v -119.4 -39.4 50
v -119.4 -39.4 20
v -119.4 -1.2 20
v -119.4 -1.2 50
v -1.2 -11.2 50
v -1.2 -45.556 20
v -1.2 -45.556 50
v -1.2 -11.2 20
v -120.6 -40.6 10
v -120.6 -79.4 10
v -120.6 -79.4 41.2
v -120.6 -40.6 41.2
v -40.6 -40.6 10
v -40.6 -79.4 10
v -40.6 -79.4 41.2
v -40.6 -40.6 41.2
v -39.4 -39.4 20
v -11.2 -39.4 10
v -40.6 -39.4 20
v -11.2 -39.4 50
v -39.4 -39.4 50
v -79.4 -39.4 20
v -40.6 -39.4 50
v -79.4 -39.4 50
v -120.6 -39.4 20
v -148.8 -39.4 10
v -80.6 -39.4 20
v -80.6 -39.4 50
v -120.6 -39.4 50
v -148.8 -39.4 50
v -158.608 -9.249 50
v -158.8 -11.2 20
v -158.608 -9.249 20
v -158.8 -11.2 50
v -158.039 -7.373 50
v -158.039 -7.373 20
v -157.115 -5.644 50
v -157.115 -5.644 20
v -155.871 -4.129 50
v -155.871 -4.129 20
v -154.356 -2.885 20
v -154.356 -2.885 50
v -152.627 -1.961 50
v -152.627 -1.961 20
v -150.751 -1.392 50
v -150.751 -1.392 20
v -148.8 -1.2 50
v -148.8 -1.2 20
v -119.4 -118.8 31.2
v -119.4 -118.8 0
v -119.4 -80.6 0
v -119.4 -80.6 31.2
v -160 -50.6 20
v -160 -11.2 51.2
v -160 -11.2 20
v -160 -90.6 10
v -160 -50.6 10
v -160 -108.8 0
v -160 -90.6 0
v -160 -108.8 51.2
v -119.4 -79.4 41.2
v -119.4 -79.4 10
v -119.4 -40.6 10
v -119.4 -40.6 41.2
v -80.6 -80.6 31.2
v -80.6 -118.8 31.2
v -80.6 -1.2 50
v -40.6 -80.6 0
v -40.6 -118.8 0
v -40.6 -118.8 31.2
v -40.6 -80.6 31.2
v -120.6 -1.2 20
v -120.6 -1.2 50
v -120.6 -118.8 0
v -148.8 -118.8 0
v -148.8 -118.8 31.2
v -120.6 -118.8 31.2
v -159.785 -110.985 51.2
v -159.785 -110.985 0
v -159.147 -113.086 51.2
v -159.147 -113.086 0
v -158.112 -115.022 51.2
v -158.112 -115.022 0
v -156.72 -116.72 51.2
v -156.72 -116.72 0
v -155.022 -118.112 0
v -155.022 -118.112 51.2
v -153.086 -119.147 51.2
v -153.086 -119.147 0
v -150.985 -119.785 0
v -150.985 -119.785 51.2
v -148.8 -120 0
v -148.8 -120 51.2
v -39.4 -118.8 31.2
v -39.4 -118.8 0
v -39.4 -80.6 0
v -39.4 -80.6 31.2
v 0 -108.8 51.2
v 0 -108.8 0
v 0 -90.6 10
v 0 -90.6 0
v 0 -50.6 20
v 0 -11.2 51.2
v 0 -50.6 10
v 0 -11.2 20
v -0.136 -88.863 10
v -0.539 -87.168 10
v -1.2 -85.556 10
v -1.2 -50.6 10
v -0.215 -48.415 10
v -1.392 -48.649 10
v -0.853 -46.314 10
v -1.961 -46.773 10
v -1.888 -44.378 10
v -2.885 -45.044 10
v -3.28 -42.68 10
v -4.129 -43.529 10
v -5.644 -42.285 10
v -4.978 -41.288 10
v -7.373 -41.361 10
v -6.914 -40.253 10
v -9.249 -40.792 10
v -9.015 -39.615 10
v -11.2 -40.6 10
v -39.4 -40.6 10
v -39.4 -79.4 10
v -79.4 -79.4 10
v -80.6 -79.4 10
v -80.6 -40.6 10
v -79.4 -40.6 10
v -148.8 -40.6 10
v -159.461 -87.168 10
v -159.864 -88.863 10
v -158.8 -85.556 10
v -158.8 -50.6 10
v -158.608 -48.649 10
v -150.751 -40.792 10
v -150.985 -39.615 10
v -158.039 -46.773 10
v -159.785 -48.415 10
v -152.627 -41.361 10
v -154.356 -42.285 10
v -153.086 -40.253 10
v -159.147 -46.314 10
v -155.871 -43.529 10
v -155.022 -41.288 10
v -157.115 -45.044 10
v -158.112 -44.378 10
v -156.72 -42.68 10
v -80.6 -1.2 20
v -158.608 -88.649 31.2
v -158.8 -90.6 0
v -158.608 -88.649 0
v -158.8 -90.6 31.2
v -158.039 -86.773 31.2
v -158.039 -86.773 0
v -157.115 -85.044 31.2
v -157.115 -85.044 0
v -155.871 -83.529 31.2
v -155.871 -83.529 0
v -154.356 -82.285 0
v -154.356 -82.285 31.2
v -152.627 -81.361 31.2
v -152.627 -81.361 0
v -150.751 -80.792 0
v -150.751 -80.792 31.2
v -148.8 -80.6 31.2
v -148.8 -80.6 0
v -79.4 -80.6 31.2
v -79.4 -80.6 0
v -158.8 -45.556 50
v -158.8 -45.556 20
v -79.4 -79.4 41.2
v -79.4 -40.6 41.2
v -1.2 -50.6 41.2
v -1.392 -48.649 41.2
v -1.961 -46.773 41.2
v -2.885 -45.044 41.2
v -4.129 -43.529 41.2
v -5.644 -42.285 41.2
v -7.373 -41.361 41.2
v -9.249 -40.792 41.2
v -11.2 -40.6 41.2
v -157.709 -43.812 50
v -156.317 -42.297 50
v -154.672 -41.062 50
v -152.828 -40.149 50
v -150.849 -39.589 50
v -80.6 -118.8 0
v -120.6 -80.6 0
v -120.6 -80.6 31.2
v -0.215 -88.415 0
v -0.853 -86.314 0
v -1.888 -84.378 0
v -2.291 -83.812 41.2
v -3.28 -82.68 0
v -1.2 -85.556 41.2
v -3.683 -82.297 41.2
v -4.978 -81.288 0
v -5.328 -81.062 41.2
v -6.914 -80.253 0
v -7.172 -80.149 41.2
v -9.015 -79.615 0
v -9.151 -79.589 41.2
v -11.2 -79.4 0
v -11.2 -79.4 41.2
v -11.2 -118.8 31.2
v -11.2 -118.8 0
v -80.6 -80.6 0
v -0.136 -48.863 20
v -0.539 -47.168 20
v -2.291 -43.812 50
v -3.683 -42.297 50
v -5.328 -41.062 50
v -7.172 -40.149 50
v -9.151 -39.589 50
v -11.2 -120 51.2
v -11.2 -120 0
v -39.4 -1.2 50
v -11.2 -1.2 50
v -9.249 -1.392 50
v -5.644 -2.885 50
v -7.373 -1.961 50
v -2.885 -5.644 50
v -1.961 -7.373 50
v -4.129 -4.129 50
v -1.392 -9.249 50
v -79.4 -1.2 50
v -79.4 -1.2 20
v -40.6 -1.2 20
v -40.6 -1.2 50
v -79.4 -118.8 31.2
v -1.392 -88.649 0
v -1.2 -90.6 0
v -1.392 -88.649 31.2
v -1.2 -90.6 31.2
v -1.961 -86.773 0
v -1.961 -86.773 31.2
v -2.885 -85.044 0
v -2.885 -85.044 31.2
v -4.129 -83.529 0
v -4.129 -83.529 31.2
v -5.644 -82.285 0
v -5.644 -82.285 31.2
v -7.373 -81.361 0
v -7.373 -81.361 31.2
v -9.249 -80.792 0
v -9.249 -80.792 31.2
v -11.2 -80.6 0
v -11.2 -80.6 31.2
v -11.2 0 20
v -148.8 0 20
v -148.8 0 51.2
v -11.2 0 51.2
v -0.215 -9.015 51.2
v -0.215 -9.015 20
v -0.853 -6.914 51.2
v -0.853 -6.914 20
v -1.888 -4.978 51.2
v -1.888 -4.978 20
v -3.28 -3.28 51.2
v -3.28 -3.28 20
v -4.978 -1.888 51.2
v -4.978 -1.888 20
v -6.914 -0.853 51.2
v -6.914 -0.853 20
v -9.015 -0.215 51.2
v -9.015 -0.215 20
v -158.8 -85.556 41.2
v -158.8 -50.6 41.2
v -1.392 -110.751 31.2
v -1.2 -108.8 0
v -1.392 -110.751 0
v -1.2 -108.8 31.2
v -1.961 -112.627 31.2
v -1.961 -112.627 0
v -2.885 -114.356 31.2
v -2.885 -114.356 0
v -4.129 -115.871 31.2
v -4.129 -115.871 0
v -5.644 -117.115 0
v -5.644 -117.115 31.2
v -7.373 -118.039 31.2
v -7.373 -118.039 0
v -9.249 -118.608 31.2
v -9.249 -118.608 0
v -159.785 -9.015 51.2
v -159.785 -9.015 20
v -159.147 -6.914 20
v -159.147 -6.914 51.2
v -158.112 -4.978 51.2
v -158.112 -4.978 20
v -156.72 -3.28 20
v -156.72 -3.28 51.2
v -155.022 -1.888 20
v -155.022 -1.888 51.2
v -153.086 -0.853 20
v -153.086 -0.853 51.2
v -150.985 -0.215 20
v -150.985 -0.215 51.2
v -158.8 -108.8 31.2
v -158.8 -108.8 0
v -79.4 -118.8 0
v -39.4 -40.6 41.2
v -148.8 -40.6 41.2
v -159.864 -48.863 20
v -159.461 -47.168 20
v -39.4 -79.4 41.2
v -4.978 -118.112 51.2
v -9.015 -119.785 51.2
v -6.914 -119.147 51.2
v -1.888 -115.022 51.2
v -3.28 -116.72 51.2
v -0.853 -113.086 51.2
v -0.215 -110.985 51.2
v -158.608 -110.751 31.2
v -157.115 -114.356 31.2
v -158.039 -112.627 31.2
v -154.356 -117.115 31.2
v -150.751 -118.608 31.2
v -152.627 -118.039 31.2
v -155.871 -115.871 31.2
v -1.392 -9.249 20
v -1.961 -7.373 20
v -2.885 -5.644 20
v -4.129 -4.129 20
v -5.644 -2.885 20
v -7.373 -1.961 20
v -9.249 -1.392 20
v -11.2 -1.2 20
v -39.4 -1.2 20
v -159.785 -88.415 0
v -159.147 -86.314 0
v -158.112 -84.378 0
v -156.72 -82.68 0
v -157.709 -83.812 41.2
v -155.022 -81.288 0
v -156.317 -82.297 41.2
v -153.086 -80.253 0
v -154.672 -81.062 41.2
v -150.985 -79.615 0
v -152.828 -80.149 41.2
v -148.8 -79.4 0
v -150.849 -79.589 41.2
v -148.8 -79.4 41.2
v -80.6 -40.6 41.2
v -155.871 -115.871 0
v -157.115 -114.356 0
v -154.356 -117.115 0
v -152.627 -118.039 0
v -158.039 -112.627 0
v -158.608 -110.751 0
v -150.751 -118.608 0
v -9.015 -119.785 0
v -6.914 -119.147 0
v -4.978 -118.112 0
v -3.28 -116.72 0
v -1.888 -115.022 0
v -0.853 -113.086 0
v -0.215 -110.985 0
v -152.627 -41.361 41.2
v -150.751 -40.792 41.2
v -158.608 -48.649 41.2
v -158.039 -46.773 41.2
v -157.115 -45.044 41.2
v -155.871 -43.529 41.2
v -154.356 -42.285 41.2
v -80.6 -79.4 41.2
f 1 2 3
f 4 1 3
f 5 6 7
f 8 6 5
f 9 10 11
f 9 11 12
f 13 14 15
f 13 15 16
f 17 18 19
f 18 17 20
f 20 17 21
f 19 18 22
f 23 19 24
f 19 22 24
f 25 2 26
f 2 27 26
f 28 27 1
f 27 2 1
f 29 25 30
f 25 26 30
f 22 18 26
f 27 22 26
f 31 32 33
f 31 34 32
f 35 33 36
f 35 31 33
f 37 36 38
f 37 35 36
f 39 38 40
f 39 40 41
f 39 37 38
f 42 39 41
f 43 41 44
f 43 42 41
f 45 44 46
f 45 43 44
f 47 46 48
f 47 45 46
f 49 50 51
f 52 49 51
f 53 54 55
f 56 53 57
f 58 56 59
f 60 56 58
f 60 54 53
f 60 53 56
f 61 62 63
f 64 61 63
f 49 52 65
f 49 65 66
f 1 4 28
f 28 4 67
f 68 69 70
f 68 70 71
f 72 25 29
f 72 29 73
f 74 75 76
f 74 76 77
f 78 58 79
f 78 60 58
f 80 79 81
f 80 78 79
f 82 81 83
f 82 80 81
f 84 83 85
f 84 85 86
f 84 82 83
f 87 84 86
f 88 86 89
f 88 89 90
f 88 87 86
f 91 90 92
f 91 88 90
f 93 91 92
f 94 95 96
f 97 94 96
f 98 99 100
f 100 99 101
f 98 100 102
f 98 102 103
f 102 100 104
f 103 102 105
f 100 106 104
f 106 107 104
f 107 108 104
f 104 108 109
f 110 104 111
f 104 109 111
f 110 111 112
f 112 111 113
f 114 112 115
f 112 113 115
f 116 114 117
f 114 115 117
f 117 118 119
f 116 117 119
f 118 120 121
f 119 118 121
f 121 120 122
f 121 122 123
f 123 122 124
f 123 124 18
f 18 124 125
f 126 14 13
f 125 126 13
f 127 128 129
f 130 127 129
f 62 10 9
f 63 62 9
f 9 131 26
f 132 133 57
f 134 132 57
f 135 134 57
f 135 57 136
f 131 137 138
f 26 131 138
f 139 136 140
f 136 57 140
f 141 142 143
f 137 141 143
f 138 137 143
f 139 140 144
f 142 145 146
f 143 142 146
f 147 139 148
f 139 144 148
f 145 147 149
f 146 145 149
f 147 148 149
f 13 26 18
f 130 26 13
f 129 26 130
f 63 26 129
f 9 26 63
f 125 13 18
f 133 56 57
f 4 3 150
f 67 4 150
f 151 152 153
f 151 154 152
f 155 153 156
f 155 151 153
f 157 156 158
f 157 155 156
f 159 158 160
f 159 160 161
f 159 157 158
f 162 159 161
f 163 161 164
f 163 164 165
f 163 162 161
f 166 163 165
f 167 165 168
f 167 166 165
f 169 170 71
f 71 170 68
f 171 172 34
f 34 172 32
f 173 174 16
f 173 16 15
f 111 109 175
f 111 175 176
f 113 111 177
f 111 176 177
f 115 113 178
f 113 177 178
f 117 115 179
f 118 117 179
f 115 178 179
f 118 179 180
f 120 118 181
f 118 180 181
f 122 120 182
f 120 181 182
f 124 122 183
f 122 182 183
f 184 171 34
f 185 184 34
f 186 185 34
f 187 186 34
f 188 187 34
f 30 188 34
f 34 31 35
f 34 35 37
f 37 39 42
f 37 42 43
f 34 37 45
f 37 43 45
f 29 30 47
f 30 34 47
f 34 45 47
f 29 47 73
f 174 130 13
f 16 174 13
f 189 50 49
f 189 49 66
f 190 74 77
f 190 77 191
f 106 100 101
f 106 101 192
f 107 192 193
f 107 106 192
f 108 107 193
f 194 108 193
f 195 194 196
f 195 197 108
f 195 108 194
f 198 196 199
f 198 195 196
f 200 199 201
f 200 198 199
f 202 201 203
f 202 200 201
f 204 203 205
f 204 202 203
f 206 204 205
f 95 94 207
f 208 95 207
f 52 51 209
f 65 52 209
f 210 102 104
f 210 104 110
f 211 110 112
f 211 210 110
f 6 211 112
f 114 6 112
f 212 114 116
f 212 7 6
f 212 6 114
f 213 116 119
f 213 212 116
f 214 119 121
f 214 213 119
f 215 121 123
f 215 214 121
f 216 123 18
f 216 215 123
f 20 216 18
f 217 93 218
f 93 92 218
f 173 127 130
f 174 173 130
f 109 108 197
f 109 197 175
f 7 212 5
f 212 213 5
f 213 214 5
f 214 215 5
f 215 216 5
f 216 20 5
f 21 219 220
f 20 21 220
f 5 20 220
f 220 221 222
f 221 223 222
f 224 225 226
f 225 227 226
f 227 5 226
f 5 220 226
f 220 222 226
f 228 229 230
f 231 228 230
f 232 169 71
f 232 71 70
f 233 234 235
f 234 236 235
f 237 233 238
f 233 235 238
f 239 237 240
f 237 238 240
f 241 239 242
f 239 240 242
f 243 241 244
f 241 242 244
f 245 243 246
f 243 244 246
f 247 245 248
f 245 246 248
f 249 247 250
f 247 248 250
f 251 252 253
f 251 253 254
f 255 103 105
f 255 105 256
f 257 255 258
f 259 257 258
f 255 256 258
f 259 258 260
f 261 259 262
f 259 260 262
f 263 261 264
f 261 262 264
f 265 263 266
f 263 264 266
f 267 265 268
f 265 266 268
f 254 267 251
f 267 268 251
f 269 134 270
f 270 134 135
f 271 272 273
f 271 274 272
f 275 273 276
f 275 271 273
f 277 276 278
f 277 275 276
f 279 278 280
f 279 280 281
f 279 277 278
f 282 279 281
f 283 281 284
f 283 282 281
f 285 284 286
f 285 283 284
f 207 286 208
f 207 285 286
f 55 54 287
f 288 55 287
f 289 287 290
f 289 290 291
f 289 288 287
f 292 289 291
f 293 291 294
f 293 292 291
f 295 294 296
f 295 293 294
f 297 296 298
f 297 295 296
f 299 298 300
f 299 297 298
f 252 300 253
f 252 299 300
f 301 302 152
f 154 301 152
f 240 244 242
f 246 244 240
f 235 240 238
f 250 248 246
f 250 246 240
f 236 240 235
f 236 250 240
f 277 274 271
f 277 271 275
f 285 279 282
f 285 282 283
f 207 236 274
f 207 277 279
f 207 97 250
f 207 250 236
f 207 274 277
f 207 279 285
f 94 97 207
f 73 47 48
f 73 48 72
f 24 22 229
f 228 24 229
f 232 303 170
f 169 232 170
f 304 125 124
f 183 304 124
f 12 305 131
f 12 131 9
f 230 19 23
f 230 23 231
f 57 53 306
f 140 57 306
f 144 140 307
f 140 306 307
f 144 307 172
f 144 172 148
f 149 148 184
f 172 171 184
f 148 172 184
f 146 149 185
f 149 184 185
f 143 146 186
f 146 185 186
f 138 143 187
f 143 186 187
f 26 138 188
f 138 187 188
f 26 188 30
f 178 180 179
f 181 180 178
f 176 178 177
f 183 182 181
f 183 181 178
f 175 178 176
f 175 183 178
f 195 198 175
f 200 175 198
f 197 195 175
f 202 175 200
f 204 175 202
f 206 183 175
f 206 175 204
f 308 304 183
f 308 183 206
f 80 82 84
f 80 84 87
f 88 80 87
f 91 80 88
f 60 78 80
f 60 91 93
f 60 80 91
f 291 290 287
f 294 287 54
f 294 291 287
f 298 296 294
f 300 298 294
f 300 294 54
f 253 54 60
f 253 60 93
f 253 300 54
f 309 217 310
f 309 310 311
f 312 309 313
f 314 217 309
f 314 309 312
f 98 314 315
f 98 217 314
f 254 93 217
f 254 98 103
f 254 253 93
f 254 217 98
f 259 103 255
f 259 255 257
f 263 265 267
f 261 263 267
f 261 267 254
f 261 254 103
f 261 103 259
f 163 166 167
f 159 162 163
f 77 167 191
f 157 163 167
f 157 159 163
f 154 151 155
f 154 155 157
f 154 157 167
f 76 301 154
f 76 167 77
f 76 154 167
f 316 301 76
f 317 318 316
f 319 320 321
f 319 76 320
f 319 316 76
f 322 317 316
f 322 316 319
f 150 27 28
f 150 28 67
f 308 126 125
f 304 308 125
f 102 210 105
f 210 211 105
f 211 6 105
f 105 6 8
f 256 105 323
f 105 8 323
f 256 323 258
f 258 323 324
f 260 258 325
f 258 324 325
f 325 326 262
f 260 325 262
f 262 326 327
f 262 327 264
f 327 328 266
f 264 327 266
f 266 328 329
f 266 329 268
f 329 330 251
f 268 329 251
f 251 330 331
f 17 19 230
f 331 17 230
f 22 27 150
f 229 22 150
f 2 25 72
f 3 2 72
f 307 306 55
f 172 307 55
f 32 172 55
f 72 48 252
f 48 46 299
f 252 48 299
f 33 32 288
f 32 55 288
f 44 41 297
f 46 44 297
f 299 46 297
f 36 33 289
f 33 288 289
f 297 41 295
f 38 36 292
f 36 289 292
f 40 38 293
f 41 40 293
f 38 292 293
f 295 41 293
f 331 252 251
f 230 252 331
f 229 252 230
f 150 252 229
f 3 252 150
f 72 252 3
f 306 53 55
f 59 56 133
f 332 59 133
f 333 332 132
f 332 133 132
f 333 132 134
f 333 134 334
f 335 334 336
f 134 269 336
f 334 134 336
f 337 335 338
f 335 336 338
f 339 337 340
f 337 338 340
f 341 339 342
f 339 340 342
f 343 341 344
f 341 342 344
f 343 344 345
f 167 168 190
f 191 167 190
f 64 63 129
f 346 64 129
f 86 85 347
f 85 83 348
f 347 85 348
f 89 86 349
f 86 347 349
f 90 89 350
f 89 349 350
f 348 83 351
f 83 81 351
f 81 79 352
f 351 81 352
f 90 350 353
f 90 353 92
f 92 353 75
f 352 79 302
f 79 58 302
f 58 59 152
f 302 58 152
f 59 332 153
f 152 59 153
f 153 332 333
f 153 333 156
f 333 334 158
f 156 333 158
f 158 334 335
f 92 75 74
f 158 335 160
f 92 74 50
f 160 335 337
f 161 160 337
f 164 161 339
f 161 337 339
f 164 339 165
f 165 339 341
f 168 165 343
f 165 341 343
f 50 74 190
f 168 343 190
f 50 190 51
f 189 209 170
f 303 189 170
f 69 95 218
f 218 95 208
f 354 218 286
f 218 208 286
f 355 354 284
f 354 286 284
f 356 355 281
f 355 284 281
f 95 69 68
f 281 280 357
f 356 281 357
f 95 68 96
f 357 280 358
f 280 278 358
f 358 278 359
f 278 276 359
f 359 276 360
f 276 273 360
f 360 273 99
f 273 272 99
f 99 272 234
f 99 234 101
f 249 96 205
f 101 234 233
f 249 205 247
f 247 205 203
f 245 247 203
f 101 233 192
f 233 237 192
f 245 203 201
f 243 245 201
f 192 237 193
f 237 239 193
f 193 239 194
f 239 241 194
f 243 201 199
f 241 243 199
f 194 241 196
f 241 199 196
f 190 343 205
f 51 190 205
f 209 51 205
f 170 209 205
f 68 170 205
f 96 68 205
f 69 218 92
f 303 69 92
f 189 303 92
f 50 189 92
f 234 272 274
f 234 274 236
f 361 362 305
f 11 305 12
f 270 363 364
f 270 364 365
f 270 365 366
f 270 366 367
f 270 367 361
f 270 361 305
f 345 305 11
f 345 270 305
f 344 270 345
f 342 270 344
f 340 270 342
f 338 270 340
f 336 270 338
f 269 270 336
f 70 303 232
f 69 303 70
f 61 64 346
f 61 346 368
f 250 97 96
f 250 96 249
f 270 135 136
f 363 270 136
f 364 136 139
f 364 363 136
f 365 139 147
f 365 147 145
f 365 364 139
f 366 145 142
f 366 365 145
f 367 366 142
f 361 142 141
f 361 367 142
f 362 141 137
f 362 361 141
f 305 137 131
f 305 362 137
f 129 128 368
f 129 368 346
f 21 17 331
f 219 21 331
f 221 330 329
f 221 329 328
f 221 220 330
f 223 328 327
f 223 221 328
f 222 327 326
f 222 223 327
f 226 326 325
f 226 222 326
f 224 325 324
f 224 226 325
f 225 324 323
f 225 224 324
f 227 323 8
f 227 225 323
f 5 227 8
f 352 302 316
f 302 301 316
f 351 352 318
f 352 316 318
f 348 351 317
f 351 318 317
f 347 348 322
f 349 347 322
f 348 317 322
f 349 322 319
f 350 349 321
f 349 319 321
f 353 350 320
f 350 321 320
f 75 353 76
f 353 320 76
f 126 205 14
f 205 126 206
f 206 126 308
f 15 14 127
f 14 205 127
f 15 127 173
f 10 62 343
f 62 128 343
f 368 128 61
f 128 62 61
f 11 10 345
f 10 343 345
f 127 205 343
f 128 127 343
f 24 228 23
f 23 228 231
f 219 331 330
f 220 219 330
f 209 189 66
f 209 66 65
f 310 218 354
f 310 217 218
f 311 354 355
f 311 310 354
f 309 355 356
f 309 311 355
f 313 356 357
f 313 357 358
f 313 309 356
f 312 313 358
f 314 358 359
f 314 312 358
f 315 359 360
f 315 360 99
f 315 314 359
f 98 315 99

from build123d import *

# Parameters (mm, degrees)
F0_W     = 160
F0_H     = 120
F0_W_2   = 38.2
F0_H_2   = 38.2
F0_W_3   = 38.8
F0_H_3   = 38.8
F1_DEPTH = 50
F2_W     = 160
F2_H     = 120
F3_DEPTH = 1.2
F5_DEPTH = 160.001
F7_DEPTH = 158.8
F8_R     = 10
F9_R     = 11.2
F10_R    = 10
F11_R    = 11.2
F11_R_2  = 11.19999


# Not quite as in the source:
# - a fillet or chamfer is up to 0.001 mm smaller than in the source, because OpenCascade refuses the exact size


with BuildPart() as f1:
    # F0 (on Top) → F1 (new body)
    with BuildSketch(Plane.XY):
        with Locations((-80, -60)):
            Rectangle(F0_W, F0_H)
        with Locations((-139.7, -99.7)):
            Rectangle(F0_W_2, F0_H_2, mode=Mode.SUBTRACT)
        with Locations((-100, -99.7)):
            Rectangle(F0_W_3, F0_H_2, mode=Mode.SUBTRACT)
        with Locations((-60, -99.7)):
            Rectangle(F0_W_3, F0_H_2, mode=Mode.SUBTRACT)
        with Locations((-20.3, -99.7)):
            Rectangle(F0_W_2, F0_H_2, mode=Mode.SUBTRACT)
        with Locations((-139.7, -60)):
            Rectangle(F0_W_2, F0_H_3, mode=Mode.SUBTRACT)
        with Locations((-100, -60)):
            Rectangle(F0_W_3, F0_H_3, mode=Mode.SUBTRACT)
        with Locations((-139.7, -20.3)):
            Rectangle(F0_W_2, F0_H_2, mode=Mode.SUBTRACT)
        with Locations((-100, -20.3)):
            Rectangle(F0_W_3, F0_H_2, mode=Mode.SUBTRACT)
        with Locations((-60, -60)):
            Rectangle(F0_W_3, F0_H_3, mode=Mode.SUBTRACT)
        with Locations((-20.3, -60)):
            Rectangle(F0_W_2, F0_H_3, mode=Mode.SUBTRACT)
        with Locations((-60, -20.3)):
            Rectangle(F0_W_3, F0_H_2, mode=Mode.SUBTRACT)
        with Locations((-20.3, -20.3)):
            Rectangle(F0_W_2, F0_H_2, mode=Mode.SUBTRACT)
    extrude(amount=F1_DEPTH)

    # F2 (on face) → F3 (join)
    with BuildSketch(Plane.XY.offset(50)):
        with Locations((-80, -60)):
            Rectangle(F2_W, F2_H)
    extrude(amount=F3_DEPTH)

    # F4 (on face) → F5 (cut, through all)
    with BuildSketch(Plane(origin=(-160, 0, 0), x_dir=(0, -1, 0), z_dir=(-1, 0, 0))):
        Polygon((79.4, 0), (79.4, 10), (39.4, 10), (39.4, 20), (0, 20), (0, 0), align=None)
    extrude(amount=-F5_DEPTH, mode=Mode.SUBTRACT)

    # F6 (on face) → F7 (join, through all)
    with BuildSketch(Plane(origin=(-160, 0, 0), x_dir=(0, -1, 0), z_dir=(-1, 0, 0))):
        Polygon((40.6, 50), (40.6, 41.2), (79.4, 41.2), (79.4, 31.2), (118.8, 31.2), (118.8, 50), align=None)
    extrude(amount=-F7_DEPTH)

    # F8
    f8_edges = [f1.edges().sort_by_distance(p)[0] for p in [
        (-1.2, -118.8, 15.6),
        (-1.2, -1.2, 35),
        (-158.8, -118.8, 15.6),
        (-158.8, -1.2, 35),
    ]]
    fillet(f8_edges, radius=F8_R)

    # F9
    f9_edges = [f1.edges().sort_by_distance(p)[0] for p in [
        (-160, 0, 35.6),
        (0, 0, 35.6),
        (0, -120, 25.6),
        (-160, -120, 25.6),
    ]]
    fillet(f9_edges, radius=F9_R)

    # F10
    f10_edges = [f1.edges().sort_by_distance(p)[0] for p in [
        (-158.8, -80.6, 15.6),
        (-158.8, -40.6, 25.6),
        (-1.2, -40.6, 25.6),
        (-1.2, -80.6, 15.6),
    ]]
    fillet(f10_edges, radius=F10_R)

    # F11 (call 1 of 4: OpenCascade refuses the feature's edges together)
    f11_edges = [f1.edges().sort_by_distance(p)[0] for p in [
        (-160, -79.4, 5),
    ]]
    fillet(f11_edges, radius=F11_R)

    # F11#2 (call 2 of 4)
    f11_2_edges = [f1.edges().sort_by_distance(p)[0] for p in [
        (-160, -39.4, 15),
    ]]
    fillet(f11_2_edges, radius=F11_R)

    # F11#3 (call 3 of 4) (radius 11.2 in the source; OpenCascade refuses exactly that, so slightly less here)
    f11_3_edges = [f1.edges().sort_by_distance(p)[0] for p in [
        (0, -79.4, 5),
    ]]
    fillet(f11_3_edges, radius=F11_R_2)

    # F11#4 (call 4 of 4)
    f11_4_edges = [f1.edges().sort_by_distance(p)[0] for p in [
        (0, -39.4, 15),
    ]]
    fillet(f11_4_edges, radius=F11_R)


solid = f1.part
